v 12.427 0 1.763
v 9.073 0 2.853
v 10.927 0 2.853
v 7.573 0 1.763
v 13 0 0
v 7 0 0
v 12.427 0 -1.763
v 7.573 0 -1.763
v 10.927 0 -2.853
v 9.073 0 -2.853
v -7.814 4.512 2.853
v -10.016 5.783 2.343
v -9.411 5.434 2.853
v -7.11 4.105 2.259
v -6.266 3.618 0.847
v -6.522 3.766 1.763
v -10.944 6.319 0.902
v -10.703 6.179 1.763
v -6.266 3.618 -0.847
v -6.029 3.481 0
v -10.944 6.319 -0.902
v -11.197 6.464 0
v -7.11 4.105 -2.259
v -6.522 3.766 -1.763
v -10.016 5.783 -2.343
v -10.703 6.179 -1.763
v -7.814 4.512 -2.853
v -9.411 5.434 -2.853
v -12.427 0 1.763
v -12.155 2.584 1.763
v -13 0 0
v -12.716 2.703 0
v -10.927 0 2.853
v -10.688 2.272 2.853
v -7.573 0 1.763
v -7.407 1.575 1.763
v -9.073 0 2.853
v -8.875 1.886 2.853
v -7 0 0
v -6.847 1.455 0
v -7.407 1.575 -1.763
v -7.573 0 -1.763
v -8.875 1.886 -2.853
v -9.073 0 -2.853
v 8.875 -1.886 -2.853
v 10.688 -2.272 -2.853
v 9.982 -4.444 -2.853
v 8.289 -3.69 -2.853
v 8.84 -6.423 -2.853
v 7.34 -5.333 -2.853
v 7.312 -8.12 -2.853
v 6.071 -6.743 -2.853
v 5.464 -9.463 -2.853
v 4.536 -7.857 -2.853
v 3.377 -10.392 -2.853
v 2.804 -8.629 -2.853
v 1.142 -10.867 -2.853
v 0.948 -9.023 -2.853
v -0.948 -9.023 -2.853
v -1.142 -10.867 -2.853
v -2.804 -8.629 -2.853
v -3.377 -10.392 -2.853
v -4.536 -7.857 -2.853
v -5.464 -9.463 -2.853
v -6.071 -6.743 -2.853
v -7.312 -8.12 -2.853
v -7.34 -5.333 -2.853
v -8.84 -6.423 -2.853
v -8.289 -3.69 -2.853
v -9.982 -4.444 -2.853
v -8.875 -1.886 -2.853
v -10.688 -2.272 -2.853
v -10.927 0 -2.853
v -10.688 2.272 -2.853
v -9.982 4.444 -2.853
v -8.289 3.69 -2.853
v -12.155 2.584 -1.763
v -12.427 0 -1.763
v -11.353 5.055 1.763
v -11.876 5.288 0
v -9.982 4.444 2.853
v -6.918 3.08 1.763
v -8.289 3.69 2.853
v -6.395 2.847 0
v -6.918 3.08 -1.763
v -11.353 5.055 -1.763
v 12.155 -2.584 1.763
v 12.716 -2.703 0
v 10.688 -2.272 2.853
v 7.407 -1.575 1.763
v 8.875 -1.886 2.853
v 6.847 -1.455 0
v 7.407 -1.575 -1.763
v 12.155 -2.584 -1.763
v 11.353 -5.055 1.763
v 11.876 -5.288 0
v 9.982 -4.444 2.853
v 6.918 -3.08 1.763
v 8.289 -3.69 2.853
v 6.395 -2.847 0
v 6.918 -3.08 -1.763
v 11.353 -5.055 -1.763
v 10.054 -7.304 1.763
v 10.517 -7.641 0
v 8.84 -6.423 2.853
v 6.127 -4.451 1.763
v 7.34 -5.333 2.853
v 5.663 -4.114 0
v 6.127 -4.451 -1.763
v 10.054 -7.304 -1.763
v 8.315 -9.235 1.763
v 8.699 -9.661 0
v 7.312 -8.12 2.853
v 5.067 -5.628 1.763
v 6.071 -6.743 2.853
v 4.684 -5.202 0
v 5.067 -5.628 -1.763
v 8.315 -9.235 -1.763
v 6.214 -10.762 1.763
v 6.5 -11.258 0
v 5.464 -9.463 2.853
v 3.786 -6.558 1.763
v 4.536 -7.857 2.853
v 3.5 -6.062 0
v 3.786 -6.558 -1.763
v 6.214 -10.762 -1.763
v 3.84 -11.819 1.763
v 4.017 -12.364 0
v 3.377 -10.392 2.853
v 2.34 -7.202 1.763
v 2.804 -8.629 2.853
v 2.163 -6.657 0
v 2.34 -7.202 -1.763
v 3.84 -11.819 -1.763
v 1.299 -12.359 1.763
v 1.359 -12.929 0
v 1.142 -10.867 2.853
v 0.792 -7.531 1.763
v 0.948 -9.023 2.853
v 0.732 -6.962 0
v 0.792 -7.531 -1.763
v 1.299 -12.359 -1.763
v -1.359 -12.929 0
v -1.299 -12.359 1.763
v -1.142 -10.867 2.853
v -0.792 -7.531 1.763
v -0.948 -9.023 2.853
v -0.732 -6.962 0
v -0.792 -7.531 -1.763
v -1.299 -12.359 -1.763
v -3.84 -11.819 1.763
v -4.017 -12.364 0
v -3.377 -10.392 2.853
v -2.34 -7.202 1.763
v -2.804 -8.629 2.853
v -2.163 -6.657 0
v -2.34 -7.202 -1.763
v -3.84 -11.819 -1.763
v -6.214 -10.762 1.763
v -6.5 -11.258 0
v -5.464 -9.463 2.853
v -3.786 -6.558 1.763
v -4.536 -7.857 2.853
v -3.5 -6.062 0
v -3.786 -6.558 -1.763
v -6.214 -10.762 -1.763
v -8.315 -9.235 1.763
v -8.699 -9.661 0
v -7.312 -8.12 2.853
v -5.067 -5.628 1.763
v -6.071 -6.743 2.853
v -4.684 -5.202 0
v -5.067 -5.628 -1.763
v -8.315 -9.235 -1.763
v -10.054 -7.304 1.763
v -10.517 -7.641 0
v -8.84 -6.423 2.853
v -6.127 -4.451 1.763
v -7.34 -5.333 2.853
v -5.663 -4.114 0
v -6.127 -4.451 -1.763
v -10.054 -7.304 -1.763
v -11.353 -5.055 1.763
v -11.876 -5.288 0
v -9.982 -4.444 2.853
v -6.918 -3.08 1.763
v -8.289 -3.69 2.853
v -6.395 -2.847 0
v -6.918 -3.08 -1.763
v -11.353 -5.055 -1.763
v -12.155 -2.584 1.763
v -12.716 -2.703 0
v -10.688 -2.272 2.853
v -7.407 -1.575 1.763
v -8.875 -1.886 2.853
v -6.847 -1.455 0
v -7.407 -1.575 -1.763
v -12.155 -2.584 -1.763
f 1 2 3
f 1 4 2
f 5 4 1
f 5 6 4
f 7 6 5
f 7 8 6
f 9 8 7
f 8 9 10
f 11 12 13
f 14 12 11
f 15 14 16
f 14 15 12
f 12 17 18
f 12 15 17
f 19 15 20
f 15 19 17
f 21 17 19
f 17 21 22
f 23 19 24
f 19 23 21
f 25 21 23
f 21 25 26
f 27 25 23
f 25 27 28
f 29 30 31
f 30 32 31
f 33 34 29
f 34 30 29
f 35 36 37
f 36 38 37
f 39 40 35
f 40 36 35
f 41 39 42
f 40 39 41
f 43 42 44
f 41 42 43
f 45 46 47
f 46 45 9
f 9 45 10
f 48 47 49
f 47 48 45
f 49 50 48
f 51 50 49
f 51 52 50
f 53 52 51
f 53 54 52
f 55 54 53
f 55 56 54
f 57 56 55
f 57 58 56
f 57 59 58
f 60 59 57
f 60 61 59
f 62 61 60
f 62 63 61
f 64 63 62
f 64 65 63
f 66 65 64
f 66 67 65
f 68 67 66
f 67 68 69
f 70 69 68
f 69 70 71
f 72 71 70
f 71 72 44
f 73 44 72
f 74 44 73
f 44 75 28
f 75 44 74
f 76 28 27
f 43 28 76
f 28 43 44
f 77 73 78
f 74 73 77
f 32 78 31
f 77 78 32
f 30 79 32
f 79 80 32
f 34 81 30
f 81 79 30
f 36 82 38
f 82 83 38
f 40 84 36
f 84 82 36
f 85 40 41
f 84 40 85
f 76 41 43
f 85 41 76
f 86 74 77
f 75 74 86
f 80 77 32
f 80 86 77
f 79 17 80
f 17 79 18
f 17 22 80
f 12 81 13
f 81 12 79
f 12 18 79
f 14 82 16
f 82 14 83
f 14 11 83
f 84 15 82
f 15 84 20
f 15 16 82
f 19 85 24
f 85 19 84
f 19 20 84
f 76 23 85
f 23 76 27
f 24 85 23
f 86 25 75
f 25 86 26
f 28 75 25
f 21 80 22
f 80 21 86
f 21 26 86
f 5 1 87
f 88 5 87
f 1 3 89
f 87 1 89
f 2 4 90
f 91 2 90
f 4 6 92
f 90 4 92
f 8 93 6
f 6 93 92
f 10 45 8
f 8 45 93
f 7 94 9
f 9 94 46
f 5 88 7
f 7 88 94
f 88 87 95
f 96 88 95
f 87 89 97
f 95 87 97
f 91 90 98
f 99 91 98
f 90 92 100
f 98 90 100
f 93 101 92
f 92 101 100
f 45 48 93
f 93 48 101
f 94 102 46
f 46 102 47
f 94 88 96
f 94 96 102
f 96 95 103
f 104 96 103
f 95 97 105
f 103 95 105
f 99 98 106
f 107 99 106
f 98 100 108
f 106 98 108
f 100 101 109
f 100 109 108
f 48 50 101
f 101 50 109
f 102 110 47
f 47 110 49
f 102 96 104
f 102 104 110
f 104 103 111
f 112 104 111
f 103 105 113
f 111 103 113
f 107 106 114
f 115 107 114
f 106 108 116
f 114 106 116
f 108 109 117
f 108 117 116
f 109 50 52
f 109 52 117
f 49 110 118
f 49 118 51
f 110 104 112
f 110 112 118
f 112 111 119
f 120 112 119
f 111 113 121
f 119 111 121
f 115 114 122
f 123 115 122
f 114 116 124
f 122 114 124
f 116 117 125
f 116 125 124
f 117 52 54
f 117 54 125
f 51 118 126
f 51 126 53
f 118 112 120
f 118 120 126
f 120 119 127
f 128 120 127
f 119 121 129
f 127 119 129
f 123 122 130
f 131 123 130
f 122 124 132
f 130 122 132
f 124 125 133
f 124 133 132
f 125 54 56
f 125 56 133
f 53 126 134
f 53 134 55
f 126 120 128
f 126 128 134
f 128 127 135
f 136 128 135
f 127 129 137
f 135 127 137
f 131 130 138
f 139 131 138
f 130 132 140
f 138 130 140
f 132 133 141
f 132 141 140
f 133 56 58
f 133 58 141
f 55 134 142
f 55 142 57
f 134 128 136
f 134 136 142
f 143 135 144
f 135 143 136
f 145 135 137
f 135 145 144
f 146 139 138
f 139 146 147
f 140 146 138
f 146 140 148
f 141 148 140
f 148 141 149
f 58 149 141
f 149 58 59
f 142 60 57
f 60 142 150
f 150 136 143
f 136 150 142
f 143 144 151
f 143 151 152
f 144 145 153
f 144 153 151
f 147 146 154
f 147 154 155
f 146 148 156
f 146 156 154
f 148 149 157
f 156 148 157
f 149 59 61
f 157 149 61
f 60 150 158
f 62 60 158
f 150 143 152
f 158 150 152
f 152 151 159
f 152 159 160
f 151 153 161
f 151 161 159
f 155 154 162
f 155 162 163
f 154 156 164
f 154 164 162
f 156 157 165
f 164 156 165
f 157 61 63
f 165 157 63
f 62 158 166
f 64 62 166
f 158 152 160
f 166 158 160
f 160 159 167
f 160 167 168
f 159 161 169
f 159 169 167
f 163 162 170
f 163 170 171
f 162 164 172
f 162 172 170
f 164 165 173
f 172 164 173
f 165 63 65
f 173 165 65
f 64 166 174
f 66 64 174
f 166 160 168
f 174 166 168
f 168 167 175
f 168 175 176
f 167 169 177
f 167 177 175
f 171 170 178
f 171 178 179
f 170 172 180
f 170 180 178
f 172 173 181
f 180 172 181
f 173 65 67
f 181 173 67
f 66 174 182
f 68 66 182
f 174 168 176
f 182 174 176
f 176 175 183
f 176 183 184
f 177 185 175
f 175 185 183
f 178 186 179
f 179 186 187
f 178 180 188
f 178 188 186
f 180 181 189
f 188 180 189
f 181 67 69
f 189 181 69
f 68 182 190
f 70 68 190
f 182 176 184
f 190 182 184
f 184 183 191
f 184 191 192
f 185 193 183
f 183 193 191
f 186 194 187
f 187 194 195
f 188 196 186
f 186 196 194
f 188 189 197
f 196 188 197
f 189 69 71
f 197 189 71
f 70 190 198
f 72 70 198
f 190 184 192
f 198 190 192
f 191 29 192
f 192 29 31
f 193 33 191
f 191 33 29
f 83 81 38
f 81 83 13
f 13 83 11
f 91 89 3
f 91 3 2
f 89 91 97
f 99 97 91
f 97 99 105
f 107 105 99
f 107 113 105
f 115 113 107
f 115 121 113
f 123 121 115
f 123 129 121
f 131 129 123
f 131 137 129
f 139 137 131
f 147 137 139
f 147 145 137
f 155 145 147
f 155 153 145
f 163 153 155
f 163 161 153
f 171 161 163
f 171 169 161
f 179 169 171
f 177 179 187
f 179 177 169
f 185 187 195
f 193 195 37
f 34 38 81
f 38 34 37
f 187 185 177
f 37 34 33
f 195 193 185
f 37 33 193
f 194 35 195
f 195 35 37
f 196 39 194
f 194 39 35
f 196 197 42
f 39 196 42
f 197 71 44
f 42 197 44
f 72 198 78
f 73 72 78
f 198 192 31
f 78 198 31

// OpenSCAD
eps = 0.1;

module cropboxes(r, deg, h=1) {
	degn = (deg % 360 > 0) ? deg % 360 : deg % 360 + 360;
	if (degn > 180)
		intersection_for(a = [0, 180 - degn])
			rotate(a) translate([-r, 0, -h/2]) cube([r*2, r*2, h]); 
	else
		for(a = [0, 180 - degn])
			rotate(a) translate([-r, 0, -h/2]) cube([r*2, r*2, h]); 
}

module cropsquares(r, deg) {
	degn = (deg % 360 > 0) ? deg % 360 : deg % 360 + 360;
	if (degn > 180)
		intersection_for(a = [0, 180 - degn])
			rotate(a) translate([-r, 0, 0]) square(r*2);
	else
		for(a = [0, 180 - degn])
			rotate(a) translate([-r, 0, 0]) square(r*2);
}

module slice(r = 10, deg = 30) {
	difference() {
		circle(r);
		cropsquares(r, deg);
	}
}

*slice(20, 190);

difference() {
	rotate_extrude(convexity=4) translate([10,0,0]) circle(r=3);
	cropboxes(13, 210, 6+eps);
}
